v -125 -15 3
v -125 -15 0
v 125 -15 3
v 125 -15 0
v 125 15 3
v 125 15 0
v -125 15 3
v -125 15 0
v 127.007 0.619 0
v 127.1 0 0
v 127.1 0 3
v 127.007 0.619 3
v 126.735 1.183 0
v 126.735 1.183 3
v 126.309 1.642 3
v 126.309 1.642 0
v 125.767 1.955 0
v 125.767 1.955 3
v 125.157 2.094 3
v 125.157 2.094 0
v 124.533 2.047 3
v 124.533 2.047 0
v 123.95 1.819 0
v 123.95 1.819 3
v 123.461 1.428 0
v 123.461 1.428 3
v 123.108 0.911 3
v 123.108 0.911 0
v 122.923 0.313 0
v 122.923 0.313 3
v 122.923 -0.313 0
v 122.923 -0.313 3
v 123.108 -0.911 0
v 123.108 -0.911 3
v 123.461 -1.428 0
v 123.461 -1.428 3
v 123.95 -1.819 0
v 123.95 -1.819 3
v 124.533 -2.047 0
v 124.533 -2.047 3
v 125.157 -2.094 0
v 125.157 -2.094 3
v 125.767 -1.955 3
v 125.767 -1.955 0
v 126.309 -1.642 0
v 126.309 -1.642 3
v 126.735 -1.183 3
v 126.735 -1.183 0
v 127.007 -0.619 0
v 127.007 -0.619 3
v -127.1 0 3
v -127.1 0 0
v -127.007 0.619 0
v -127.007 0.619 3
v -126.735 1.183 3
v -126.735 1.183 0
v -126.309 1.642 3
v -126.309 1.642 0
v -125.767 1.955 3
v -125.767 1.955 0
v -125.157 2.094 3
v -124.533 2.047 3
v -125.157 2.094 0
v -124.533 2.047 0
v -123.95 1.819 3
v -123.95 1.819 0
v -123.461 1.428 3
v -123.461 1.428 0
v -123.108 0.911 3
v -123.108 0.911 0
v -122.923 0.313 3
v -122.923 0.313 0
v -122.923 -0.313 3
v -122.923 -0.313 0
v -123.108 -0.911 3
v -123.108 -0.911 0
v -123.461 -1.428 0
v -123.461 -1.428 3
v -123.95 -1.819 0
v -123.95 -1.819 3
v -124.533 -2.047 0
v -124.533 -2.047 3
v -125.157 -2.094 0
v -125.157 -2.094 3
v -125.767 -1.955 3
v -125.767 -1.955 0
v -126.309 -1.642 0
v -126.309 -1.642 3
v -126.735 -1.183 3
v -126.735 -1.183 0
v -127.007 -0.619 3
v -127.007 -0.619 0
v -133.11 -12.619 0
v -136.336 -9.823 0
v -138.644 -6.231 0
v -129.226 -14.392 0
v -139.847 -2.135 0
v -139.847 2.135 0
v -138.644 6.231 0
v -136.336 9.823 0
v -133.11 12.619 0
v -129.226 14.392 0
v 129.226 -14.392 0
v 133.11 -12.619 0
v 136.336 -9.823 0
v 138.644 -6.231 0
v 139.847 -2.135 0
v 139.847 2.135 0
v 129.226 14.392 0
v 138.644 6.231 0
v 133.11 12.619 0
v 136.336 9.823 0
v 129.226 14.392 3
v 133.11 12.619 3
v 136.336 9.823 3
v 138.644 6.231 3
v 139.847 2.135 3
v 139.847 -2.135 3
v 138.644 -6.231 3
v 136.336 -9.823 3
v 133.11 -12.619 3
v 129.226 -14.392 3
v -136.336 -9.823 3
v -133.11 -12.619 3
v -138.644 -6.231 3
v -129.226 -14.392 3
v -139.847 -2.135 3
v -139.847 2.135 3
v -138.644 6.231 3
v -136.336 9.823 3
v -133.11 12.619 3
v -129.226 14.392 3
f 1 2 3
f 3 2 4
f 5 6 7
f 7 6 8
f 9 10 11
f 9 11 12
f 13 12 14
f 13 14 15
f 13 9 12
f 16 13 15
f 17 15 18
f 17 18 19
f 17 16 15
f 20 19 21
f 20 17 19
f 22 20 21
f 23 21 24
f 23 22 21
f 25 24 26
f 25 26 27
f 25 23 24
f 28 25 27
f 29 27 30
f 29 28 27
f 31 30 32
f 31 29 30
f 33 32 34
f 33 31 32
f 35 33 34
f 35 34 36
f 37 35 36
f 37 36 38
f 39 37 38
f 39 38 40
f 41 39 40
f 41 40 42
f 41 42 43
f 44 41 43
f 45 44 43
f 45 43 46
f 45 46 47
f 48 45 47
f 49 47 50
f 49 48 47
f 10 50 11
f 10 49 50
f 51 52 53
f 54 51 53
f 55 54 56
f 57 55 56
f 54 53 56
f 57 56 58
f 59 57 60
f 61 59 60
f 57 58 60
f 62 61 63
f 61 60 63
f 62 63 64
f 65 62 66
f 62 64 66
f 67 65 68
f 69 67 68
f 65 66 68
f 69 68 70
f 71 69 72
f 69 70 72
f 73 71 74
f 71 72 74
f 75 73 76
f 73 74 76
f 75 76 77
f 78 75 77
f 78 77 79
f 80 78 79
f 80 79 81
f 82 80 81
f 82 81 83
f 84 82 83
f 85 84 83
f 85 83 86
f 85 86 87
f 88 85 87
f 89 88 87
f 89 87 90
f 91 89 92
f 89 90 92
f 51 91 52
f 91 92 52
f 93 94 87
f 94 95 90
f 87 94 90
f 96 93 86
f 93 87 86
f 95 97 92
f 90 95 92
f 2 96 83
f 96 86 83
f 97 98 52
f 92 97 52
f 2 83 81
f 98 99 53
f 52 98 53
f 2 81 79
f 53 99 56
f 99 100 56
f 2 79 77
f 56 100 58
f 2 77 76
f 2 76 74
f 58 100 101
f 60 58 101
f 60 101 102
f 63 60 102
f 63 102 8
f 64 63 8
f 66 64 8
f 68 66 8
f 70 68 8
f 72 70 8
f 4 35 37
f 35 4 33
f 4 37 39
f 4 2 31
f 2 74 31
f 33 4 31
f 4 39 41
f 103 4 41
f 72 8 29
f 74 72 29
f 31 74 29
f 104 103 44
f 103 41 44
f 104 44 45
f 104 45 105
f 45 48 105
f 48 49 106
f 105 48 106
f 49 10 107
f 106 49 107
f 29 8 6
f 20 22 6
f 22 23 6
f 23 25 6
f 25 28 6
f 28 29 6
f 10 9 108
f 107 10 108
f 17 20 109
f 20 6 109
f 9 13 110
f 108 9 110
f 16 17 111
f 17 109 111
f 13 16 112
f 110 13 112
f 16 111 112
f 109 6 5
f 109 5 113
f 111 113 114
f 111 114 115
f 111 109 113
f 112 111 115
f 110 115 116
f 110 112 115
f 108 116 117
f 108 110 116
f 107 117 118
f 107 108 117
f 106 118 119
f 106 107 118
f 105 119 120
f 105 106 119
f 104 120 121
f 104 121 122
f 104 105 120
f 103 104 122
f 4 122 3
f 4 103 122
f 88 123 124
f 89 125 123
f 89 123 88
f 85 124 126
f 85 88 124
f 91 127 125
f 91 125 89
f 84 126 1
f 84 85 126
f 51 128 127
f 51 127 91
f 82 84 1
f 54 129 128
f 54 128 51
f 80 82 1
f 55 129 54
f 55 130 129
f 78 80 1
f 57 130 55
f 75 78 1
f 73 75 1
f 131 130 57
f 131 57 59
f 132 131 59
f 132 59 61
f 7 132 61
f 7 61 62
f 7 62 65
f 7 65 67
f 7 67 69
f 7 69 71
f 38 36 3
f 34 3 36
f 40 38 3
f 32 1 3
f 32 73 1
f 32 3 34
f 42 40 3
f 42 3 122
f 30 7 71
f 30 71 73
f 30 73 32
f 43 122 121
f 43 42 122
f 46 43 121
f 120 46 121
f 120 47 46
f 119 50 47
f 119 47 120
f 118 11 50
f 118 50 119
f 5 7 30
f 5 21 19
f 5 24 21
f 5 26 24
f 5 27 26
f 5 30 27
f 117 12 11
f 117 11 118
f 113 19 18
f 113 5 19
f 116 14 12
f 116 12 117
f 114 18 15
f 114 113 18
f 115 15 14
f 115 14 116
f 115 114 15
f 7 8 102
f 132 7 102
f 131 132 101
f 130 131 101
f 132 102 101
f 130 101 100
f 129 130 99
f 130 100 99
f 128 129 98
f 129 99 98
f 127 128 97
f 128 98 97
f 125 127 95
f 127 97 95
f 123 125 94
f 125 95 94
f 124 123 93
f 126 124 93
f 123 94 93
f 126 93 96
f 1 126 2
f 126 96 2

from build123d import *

# Parameters (mm, degrees)
ESQUISSE1_R        = 2.1
BOSS_EXTRU_1_DEPTH = 3


with BuildPart() as part:
    # Esquisse1 → Boss.-Extru.1 (new body)
    with BuildSketch(Plane.XY):
        with BuildLine():
            Line((0, 15), (125, 15))
            ThreePointArc((125, 15), (140, 0), (125, -15))
            Line((125, -15), (0, -15))
            Line((0, -15), (0, 15))
        make_face()
        with Locations((125, 0)):
            Circle(ESQUISSE1_R, mode=Mode.SUBTRACT)
    extrude(amount=BOSS_EXTRU_1_DEPTH)

    # Symétrie1: part across plane


with BuildPart() as part_1:
    add(part.part)
    add(part.part.mirror(Plane(origin=(0, 15, 3), x_dir=(0, 0, 1), z_dir=(1, 0, 0))))


solid = part_1.part
